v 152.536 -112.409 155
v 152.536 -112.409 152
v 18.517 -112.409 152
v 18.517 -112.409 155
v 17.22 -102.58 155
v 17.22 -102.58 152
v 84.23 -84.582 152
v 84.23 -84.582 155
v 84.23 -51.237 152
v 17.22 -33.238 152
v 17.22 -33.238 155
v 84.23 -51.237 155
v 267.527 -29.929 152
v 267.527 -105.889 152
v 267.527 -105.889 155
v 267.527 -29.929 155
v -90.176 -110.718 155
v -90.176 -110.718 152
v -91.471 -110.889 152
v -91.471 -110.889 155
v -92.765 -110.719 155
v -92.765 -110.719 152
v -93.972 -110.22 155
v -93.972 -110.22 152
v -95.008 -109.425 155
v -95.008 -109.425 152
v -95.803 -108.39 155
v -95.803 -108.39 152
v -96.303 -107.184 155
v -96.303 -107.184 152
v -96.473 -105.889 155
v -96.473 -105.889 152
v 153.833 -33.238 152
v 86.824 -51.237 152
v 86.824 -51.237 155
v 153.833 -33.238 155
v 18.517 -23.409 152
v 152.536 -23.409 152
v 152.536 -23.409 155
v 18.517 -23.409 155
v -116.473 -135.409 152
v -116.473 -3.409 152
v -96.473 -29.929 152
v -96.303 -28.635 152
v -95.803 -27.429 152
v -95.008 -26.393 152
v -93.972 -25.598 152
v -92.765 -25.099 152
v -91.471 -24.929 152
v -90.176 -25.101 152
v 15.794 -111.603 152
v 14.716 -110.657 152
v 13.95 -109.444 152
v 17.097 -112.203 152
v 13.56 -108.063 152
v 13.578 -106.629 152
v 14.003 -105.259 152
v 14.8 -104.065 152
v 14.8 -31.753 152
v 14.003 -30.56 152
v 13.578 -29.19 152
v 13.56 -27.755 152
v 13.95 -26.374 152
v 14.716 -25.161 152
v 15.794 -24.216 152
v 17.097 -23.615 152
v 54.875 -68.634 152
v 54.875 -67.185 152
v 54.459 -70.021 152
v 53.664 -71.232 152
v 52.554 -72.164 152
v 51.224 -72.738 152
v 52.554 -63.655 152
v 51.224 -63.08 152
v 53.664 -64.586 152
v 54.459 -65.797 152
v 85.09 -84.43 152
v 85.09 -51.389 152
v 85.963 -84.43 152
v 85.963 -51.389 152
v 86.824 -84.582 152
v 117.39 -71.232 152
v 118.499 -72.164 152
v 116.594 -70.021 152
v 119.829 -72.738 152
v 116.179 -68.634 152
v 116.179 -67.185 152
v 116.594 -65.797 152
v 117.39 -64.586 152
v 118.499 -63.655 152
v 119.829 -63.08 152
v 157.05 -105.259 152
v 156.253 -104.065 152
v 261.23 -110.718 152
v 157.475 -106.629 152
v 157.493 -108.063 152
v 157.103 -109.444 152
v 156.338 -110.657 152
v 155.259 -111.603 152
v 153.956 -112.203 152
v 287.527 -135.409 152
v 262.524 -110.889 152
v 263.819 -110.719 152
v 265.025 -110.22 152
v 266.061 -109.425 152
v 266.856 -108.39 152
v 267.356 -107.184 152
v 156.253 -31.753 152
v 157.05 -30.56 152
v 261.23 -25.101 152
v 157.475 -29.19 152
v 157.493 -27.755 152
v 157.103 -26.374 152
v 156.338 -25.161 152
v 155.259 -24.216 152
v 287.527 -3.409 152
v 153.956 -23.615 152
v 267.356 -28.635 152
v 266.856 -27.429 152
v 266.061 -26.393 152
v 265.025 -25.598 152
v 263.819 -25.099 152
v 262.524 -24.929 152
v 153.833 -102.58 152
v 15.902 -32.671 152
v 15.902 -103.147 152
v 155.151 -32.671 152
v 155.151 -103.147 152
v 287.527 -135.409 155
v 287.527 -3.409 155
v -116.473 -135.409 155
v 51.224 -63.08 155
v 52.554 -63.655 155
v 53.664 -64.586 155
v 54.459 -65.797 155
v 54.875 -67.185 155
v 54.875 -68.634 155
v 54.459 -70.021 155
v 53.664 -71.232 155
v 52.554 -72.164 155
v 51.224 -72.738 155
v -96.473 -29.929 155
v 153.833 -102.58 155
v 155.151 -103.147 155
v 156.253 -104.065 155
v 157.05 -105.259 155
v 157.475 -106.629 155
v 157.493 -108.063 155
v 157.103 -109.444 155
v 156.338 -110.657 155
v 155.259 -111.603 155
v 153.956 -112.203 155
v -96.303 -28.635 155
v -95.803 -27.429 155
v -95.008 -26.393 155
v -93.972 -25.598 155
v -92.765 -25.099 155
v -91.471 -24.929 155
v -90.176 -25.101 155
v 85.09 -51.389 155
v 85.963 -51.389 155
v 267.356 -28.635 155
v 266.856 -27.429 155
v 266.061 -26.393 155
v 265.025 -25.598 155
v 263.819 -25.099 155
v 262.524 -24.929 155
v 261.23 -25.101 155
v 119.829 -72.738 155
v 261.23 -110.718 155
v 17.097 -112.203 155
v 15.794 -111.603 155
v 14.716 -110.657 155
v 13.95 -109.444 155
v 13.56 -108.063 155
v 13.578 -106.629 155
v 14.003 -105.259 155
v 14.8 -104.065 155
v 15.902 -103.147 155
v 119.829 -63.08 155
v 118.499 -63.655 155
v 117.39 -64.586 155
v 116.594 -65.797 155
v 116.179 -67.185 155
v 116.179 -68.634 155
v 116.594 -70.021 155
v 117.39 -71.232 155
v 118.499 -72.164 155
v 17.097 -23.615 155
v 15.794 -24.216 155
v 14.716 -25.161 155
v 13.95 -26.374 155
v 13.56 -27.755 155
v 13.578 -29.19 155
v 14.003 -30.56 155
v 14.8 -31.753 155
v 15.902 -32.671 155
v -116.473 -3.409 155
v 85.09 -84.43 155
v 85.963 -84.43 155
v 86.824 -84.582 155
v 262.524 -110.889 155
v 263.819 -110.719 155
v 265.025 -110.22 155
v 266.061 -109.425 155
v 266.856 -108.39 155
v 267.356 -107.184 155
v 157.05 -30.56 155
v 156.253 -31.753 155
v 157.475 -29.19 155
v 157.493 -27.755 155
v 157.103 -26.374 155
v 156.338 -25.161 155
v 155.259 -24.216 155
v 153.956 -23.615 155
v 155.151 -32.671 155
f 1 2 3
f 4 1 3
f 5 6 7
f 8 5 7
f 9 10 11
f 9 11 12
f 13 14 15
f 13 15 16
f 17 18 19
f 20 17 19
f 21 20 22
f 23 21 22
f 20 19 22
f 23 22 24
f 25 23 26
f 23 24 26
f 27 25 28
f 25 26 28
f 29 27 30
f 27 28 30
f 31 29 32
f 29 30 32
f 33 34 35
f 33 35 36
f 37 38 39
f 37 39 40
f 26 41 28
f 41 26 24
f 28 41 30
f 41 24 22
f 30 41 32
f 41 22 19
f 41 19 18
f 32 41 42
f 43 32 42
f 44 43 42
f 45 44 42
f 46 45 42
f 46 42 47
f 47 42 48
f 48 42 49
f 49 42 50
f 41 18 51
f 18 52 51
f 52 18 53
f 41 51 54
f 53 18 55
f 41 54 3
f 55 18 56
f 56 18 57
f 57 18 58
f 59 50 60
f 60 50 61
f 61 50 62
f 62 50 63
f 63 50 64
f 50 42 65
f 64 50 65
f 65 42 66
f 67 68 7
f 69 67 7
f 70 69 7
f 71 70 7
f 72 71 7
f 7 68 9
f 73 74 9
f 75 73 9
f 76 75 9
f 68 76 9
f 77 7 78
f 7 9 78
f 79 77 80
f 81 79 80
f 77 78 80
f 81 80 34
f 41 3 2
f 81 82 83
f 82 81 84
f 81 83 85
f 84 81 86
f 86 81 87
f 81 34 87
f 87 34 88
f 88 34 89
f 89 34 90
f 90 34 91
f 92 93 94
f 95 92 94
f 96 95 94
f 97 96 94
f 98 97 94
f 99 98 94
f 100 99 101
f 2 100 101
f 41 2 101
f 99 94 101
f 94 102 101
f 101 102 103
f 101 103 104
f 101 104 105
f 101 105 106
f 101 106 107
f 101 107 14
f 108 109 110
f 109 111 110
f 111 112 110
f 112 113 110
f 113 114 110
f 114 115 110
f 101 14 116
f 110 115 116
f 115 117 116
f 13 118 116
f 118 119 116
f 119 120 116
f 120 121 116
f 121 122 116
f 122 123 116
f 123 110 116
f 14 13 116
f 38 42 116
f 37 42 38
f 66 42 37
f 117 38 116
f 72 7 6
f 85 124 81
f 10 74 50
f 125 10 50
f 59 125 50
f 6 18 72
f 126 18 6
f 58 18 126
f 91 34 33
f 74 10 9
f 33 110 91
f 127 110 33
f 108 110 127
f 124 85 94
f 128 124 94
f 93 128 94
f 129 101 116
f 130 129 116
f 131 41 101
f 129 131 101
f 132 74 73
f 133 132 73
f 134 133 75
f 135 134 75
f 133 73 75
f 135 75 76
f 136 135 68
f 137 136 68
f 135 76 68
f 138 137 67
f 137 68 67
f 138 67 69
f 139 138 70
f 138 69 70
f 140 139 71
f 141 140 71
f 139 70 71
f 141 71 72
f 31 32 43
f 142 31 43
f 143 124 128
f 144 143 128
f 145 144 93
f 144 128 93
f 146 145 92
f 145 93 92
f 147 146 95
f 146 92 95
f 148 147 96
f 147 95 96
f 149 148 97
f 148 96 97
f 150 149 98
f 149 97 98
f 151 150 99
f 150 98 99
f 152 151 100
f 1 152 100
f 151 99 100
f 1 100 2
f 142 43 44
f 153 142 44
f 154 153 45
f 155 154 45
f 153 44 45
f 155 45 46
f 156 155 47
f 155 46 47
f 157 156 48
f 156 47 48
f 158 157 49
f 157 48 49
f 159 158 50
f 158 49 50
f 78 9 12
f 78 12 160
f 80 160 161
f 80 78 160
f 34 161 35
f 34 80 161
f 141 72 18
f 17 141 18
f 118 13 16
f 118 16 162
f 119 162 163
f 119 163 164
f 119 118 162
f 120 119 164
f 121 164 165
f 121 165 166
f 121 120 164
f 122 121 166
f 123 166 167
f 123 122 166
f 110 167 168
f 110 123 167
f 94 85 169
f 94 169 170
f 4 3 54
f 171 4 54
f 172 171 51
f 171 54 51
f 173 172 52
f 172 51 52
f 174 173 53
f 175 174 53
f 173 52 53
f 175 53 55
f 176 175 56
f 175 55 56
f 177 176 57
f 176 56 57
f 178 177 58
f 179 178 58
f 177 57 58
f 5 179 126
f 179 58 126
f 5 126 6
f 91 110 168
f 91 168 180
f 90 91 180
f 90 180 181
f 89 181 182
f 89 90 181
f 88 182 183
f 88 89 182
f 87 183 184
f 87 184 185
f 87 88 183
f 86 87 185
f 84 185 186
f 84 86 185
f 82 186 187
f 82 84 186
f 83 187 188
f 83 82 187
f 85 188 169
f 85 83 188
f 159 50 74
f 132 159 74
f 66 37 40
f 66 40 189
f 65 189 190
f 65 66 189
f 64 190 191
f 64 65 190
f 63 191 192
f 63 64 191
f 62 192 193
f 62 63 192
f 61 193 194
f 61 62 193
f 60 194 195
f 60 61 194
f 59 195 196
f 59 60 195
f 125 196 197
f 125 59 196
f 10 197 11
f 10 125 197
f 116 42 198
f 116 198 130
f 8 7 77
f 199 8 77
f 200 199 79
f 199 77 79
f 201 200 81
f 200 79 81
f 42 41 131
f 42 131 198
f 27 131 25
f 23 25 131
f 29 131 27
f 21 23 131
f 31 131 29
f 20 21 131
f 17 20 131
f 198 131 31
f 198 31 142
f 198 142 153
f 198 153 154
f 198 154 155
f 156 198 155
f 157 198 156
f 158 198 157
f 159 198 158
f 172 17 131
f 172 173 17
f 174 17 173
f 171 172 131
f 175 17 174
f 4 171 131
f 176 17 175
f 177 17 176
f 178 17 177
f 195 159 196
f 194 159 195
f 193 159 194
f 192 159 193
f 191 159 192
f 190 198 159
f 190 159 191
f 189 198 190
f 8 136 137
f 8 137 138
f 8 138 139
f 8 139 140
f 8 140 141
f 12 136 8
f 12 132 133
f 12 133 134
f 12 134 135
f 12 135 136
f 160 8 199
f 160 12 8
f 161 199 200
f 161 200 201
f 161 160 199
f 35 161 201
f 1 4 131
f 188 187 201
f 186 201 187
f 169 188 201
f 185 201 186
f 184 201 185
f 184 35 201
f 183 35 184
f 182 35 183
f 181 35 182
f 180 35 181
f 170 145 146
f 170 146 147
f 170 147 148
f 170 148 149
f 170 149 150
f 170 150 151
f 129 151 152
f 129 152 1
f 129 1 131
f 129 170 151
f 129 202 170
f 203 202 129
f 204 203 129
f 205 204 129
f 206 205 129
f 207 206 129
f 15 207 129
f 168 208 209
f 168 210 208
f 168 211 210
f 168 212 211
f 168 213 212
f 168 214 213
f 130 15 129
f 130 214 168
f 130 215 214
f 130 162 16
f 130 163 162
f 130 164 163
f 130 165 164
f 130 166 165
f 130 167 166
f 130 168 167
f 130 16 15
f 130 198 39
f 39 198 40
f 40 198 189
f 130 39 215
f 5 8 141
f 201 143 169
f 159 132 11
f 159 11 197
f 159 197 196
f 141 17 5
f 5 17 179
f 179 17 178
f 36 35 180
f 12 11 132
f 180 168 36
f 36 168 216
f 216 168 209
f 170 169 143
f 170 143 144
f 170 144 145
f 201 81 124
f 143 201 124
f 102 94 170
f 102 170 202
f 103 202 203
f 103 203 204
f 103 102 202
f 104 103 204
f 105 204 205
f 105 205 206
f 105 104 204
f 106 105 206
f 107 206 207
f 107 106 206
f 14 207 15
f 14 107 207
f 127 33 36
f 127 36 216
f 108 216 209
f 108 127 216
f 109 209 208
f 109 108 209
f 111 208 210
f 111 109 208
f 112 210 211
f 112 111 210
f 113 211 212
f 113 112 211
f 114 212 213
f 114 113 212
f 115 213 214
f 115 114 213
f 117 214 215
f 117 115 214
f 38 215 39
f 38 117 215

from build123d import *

# Parameters (mm, degrees)
SKETCH1_W           = 404
SKETCH1_H           = 132
BOSS_EXTRUDE1_DEPTH = 3


with BuildPart() as part:
    # Sketch1 → Boss-Extrude1 (new body)
    with BuildSketch(Plane.XY.offset(152)):
        with Locations((85.526581968, -69.40919868)):
            Rectangle(SKETCH1_W, SKETCH1_H)
        with BuildLine():
            Line((-96.473418032, -105.888993971), (-96.473418032, -29.929403389))
            ThreePointArc((-96.473418032, -29.929403389), (-94.516026587, -25.961717264), (-90.176404758, -25.100557091))
            Line((-90.176404758, -25.100557091), (51.22430223, -63.080352382))
            ThreePointArc((51.22430223, -63.080352382), (54.927288957, -67.90919868), (51.22430223, -72.738044978))
            Line((51.22430223, -72.738044978), (-90.176404758, -110.717840269))
            ThreePointArc((-90.176404758, -110.717840269), (-94.516026587, -109.856680096), (-96.473418032, -105.888993971))
        make_face(mode=Mode.SUBTRACT)
        with BuildLine():
            Line((152.536061434, -23.40919868), (18.517102502, -23.40919868))
            ThreePointArc((18.517102502, -23.40919868), (13.560075596, -27.755070057), (17.220089228, -33.238044978))
            Line((17.220089228, -33.238044978), (84.229568694, -51.236585203))
            ThreePointArc((84.229568694, -51.236585203), (85.526581968, -51.407738905), (86.823595242, -51.236585203))
            Line((86.823595242, -51.236585203), (153.833074707, -33.238044978))
            ThreePointArc((153.833074707, -33.238044978), (157.493088339, -27.755070057), (152.536061434, -23.40919868))
        make_face(mode=Mode.SUBTRACT)
        with BuildLine():
            Line((261.229568694, -25.100557091), (119.828861705, -63.080352382))
            ThreePointArc((119.828861705, -63.080352382), (116.125874979, -67.90919868), (119.828861705, -72.738044978))
            Line((119.828861705, -72.738044978), (261.229568694, -110.717840269))
            ThreePointArc((261.229568694, -110.717840269), (265.569190522, -109.856680096), (267.526581968, -105.888993971))
            Line((267.526581968, -105.888993971), (267.526581968, -29.929403389))
            ThreePointArc((267.526581968, -29.929403389), (265.569190522, -25.961717264), (261.229568694, -25.100557091))
        make_face(mode=Mode.SUBTRACT)
        with BuildLine():
            Line((17.220089228, -102.580352382), (84.229568694, -84.581812156))
            ThreePointArc((84.229568694, -84.581812156), (85.526581968, -84.410658454), (86.823595242, -84.581812156))
            Line((86.823595242, -84.581812156), (153.833074707, -102.580352382))
            ThreePointArc((153.833074707, -102.580352382), (157.493088339, -108.063327303), (152.536061434, -112.40919868))
            Line((152.536061434, -112.40919868), (18.517102502, -112.40919868))
            ThreePointArc((18.517102502, -112.40919868), (13.560075596, -108.063327303), (17.220089228, -102.580352382))
        make_face(mode=Mode.SUBTRACT)
    extrude(amount=BOSS_EXTRUDE1_DEPTH)


solid = part.part
